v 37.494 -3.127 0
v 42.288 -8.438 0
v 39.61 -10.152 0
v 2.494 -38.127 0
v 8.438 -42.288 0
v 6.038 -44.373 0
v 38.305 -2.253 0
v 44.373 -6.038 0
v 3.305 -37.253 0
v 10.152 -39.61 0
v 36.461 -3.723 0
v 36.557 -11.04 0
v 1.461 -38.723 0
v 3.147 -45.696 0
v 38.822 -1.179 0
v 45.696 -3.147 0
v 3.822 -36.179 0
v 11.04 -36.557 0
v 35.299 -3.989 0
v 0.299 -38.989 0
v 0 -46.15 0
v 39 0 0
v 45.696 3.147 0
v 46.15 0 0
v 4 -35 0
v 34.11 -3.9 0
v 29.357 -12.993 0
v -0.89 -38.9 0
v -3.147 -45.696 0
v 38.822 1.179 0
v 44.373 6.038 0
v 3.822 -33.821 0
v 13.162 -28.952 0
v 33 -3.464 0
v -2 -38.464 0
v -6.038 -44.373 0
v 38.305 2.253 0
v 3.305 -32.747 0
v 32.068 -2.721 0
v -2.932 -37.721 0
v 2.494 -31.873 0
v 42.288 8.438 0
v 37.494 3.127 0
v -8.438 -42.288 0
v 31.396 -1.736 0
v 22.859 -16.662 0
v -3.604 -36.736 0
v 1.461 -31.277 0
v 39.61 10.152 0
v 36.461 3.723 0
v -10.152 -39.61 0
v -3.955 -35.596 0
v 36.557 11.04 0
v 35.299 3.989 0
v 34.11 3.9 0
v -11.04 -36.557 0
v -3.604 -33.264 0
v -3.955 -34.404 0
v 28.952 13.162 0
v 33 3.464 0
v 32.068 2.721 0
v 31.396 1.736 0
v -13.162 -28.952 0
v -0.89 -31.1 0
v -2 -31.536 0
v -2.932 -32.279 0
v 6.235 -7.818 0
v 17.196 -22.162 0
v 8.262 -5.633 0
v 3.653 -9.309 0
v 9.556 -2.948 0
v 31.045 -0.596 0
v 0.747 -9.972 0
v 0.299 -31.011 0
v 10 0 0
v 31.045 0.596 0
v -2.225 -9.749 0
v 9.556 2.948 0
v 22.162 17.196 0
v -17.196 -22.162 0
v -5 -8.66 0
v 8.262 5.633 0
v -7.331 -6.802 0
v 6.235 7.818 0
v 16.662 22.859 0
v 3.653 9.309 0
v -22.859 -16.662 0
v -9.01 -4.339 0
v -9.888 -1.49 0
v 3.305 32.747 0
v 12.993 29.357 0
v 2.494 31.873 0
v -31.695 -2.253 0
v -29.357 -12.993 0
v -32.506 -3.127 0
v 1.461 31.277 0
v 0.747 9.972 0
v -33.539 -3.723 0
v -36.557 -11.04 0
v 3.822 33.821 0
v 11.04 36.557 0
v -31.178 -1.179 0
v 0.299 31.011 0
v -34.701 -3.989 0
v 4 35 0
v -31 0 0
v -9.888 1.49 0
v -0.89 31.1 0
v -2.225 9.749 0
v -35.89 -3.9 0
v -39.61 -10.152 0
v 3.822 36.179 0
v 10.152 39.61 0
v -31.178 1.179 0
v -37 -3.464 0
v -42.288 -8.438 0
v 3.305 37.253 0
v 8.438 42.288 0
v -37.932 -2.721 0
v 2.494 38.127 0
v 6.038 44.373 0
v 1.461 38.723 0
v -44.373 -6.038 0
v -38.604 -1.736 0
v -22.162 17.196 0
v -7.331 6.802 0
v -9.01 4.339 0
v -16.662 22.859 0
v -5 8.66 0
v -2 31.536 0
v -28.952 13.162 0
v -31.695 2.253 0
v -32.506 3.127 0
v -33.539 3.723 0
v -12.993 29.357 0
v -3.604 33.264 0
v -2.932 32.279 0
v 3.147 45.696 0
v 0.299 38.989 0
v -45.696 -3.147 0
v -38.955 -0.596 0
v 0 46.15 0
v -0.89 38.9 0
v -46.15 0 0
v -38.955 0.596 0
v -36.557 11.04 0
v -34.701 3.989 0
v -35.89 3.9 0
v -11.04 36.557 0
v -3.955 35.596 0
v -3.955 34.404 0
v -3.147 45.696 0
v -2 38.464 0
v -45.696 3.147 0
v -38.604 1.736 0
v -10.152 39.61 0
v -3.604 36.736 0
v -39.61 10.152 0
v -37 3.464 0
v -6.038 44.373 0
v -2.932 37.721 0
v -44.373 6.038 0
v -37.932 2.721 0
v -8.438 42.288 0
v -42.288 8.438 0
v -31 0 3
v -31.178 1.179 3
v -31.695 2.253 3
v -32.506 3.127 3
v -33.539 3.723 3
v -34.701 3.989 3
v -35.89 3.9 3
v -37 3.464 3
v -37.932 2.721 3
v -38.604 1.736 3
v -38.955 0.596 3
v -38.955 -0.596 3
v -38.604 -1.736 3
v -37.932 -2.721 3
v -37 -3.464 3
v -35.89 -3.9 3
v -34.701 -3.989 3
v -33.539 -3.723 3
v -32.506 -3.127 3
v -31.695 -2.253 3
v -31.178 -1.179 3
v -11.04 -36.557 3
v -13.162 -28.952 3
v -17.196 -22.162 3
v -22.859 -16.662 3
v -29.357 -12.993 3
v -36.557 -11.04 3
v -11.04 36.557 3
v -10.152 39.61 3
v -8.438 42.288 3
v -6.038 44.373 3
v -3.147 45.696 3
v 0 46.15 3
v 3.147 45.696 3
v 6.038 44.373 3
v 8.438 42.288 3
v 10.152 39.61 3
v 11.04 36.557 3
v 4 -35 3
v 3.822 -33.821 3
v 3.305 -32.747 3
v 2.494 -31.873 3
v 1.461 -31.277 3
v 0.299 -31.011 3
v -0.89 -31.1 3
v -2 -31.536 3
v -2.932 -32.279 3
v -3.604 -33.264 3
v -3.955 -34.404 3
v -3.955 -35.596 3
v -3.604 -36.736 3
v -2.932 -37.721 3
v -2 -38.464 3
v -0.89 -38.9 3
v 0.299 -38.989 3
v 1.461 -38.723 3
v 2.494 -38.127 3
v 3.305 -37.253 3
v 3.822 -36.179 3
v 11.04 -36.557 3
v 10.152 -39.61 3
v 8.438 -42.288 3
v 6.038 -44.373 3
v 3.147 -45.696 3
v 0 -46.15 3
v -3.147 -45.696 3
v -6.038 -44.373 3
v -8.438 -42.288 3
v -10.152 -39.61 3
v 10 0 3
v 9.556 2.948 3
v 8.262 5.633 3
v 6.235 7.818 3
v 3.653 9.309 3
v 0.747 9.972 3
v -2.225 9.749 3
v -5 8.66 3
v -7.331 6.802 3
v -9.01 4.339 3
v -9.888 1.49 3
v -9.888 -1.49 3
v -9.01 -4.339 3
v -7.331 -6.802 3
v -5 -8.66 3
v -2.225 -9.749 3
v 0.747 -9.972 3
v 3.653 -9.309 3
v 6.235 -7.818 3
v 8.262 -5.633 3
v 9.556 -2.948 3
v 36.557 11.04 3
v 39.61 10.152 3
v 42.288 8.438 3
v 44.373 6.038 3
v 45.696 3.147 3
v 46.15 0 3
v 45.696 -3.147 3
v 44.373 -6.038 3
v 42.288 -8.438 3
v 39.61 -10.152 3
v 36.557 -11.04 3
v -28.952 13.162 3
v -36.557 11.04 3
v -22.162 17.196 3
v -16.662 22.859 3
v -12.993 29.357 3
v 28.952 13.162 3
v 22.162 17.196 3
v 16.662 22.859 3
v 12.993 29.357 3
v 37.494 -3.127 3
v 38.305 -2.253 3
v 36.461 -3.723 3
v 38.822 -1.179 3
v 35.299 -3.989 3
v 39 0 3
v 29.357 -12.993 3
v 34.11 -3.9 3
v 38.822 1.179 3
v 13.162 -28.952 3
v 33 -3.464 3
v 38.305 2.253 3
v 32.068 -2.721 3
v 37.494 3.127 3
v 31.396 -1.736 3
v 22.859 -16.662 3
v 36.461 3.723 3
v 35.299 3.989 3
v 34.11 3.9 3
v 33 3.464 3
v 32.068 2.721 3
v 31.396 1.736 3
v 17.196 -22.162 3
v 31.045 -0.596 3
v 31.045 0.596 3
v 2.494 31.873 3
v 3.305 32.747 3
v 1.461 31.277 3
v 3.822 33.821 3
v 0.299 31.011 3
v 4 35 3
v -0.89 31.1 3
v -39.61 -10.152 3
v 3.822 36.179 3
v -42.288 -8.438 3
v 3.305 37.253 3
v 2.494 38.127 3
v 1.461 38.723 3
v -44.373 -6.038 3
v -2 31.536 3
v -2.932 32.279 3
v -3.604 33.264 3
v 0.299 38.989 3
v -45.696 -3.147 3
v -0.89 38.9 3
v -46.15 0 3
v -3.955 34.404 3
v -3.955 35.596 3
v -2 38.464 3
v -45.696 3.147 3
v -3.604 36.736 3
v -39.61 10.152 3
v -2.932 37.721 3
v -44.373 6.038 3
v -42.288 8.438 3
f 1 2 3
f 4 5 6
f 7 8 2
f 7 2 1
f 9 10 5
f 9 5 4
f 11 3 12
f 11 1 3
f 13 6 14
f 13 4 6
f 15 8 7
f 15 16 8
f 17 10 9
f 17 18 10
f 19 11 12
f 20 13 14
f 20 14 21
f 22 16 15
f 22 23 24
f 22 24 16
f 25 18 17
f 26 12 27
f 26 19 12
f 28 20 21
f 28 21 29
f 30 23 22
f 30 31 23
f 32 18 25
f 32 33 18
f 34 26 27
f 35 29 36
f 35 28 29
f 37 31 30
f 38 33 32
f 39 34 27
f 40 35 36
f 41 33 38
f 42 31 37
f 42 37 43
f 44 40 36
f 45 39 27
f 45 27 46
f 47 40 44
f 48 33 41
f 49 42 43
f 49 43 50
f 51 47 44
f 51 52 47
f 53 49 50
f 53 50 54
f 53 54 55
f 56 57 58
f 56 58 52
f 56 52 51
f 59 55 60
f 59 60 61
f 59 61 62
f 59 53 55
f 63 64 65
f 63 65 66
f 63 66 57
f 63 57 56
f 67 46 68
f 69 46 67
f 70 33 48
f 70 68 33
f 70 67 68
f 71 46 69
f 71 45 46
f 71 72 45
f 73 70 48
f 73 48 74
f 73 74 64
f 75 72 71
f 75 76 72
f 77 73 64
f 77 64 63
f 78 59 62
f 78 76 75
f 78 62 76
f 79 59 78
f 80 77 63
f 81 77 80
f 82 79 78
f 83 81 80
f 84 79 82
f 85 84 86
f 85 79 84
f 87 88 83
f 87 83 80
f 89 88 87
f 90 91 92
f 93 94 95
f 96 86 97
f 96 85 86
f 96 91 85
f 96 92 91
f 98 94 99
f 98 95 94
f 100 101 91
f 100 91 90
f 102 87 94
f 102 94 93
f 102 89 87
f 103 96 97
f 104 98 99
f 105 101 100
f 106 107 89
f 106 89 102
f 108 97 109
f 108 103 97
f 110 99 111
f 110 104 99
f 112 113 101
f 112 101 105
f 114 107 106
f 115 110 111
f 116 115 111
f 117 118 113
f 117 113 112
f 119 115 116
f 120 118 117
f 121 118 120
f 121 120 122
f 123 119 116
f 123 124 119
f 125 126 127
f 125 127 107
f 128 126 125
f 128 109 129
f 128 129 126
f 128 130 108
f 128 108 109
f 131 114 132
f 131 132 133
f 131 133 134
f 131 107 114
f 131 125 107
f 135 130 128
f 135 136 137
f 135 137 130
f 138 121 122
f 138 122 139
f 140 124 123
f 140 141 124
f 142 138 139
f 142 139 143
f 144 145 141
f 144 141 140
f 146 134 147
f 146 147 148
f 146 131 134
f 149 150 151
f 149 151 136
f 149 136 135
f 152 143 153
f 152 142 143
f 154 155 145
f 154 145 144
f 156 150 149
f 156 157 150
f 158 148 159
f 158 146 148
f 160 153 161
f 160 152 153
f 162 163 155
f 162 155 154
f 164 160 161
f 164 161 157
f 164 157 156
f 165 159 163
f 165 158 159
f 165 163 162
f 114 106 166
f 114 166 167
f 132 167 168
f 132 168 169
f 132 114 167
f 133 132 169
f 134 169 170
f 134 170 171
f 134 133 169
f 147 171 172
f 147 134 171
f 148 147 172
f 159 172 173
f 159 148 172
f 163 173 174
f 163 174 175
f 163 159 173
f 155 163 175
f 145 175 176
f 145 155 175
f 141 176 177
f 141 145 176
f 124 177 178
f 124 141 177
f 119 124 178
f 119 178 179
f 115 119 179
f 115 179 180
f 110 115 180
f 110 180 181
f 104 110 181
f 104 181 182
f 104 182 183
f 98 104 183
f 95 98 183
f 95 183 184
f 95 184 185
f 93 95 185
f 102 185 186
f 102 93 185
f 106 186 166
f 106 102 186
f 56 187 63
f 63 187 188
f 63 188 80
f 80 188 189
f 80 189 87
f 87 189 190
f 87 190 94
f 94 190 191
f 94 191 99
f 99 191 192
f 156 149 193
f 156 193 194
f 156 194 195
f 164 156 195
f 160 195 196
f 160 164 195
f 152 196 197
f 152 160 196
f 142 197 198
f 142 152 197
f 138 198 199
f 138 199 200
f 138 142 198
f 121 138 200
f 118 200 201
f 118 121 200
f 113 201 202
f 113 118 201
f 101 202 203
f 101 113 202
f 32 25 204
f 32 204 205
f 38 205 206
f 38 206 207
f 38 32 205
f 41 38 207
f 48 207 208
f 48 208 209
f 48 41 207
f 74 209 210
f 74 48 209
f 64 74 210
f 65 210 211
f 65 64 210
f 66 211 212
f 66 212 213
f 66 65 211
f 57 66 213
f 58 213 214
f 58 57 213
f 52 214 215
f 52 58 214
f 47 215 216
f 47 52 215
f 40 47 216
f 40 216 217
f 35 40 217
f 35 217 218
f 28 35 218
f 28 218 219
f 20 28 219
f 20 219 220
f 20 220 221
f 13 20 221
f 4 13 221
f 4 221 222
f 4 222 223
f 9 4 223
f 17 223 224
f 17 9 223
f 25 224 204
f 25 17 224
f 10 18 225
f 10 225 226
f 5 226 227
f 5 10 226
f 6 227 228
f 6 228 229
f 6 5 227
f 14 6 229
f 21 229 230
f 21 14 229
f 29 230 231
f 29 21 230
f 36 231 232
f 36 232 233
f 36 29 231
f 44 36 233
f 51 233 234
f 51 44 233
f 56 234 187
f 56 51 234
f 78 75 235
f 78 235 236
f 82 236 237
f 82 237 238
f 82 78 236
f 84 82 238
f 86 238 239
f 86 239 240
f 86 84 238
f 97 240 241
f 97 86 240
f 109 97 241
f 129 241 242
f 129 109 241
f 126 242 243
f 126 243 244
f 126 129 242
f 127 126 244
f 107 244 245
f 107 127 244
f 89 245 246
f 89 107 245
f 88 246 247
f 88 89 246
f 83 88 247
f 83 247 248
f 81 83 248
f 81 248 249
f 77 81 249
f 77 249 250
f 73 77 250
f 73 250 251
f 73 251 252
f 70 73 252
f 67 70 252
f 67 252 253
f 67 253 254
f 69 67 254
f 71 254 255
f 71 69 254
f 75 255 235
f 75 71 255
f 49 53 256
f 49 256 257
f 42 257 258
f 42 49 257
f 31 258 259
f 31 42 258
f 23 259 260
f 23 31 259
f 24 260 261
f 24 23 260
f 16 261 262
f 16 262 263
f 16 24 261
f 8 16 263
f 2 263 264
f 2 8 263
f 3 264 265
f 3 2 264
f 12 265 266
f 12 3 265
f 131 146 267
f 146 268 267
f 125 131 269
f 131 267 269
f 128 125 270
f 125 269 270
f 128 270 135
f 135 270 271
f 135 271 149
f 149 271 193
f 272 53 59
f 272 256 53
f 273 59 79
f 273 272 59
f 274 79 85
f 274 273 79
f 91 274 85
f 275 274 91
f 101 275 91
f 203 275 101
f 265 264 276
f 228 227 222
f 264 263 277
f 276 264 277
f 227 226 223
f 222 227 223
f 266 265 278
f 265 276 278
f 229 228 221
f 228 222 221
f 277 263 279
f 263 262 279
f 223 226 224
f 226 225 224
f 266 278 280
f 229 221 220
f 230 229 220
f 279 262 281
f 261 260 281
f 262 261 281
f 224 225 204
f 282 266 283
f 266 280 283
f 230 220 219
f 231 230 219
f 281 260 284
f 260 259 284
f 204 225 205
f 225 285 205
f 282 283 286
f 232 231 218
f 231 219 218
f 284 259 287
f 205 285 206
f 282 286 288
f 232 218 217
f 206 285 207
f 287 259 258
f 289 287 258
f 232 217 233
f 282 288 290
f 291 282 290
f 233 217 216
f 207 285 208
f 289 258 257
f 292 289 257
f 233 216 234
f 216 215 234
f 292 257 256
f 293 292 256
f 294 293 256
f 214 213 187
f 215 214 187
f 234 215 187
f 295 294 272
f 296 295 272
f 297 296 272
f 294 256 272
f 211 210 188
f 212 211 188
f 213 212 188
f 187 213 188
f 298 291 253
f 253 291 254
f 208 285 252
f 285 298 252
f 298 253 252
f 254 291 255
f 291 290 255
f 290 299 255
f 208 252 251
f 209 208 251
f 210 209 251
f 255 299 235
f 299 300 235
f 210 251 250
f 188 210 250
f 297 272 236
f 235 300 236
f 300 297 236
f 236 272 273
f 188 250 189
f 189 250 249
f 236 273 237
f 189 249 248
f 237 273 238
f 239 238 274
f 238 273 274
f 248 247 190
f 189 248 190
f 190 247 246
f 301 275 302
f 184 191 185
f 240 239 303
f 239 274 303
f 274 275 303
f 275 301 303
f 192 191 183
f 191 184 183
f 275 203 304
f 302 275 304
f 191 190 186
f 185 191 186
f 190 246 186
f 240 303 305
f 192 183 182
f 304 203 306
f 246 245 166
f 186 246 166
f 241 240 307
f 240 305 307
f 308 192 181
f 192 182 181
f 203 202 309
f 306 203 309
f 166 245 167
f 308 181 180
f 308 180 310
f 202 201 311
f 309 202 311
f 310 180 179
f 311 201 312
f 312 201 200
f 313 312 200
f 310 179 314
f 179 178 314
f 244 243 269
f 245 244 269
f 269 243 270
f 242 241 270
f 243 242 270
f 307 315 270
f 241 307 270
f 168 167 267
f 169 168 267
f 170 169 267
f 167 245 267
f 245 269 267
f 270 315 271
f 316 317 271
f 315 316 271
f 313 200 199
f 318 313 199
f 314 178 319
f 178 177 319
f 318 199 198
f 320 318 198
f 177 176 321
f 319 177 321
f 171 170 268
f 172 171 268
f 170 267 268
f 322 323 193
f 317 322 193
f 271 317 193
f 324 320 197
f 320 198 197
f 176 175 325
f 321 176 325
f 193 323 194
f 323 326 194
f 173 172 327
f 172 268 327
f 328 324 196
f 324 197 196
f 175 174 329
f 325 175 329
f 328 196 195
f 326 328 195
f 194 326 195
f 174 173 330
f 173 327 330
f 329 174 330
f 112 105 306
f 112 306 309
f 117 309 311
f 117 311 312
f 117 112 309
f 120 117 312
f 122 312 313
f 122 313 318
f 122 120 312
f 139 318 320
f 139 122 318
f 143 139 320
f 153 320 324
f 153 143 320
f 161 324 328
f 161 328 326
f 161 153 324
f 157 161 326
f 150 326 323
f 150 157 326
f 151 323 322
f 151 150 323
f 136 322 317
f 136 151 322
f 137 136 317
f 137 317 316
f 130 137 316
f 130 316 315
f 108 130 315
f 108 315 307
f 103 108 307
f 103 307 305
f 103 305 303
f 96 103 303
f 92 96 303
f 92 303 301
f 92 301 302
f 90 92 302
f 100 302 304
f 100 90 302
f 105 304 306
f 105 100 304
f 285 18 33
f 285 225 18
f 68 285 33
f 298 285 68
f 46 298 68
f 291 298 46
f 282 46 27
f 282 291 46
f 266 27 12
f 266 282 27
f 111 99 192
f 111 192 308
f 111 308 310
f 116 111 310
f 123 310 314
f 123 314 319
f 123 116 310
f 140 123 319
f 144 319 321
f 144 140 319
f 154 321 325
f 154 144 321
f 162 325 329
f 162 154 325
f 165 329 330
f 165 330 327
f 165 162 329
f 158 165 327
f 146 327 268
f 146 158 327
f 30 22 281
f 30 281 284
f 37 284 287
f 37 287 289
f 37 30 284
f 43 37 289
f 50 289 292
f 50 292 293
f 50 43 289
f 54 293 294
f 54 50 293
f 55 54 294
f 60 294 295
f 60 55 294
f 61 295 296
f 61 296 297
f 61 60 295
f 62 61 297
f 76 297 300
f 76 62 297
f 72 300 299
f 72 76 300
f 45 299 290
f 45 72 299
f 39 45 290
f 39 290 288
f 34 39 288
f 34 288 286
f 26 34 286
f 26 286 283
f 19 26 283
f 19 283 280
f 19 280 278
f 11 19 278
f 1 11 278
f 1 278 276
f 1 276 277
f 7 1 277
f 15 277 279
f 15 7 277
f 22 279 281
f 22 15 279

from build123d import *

# Parameters (mm, degrees)
SKETCH1_R           = 4
SKETCH1_R_2         = 10
BOSS_EXTRUDE1_DEPTH = 3
FILLET1_R           = 30


with BuildPart() as part:
    # Sketch1 → Boss-Extrude1 (new body)
    with BuildSketch(Plane.XY):
        with BuildLine():
            Line((-11.149584488, -35), (-11.149584488, -11.149584488))
            Line((-11.149584488, -11.149584488), (-35, -11.149584488))
            ThreePointArc((-35, -11.149584488), (-46.149584488, 0), (-35, 11.149584488))
            Line((-35, 11.149584488), (-11.149584488, 11.149584488))
            Line((-11.149584488, 11.149584488), (-11.149584488, 35))
            ThreePointArc((-11.149584488, 35), (0, 46.149584488), (11.149584488, 35))
            Line((11.149584488, 35), (11.149584488, 11.149584488))
            Line((11.149584488, 11.149584488), (35, 11.149584488))
            ThreePointArc((35, 11.149584488), (46.149584488, 0), (35, -11.149584488))
            Line((35, -11.149584488), (11.149584488, -11.149584488))
            Line((11.149584488, -11.149584488), (11.149584488, -35))
            ThreePointArc((11.149584488, -35), (0, -46.149584488), (-11.149584488, -35))
        make_face()
        with Locations((-35, 0)):
            Circle(SKETCH1_R, mode=Mode.SUBTRACT)
        with Locations((35, 0)):
            Circle(SKETCH1_R, mode=Mode.SUBTRACT)
        with Locations((0, 35)):
            Circle(SKETCH1_R, mode=Mode.SUBTRACT)
        with Locations((0, -35)):
            Circle(SKETCH1_R, mode=Mode.SUBTRACT)
        Circle(SKETCH1_R_2, mode=Mode.SUBTRACT)
    extrude(amount=BOSS_EXTRUDE1_DEPTH)

    # Fillet1
    fillet1_edges = [part.edges().sort_by_distance(p)[0] for p in [
        (-11.149584488, 11.149584488, 1.5),
        (11.149584488, 11.149584488, 1.5),
        (11.149584488, -11.149584488, 1.5),
        (-11.149584488, -11.149584488, 1.5),
    ]]
    fillet(fillet1_edges, radius=FILLET1_R)


solid = part.part
